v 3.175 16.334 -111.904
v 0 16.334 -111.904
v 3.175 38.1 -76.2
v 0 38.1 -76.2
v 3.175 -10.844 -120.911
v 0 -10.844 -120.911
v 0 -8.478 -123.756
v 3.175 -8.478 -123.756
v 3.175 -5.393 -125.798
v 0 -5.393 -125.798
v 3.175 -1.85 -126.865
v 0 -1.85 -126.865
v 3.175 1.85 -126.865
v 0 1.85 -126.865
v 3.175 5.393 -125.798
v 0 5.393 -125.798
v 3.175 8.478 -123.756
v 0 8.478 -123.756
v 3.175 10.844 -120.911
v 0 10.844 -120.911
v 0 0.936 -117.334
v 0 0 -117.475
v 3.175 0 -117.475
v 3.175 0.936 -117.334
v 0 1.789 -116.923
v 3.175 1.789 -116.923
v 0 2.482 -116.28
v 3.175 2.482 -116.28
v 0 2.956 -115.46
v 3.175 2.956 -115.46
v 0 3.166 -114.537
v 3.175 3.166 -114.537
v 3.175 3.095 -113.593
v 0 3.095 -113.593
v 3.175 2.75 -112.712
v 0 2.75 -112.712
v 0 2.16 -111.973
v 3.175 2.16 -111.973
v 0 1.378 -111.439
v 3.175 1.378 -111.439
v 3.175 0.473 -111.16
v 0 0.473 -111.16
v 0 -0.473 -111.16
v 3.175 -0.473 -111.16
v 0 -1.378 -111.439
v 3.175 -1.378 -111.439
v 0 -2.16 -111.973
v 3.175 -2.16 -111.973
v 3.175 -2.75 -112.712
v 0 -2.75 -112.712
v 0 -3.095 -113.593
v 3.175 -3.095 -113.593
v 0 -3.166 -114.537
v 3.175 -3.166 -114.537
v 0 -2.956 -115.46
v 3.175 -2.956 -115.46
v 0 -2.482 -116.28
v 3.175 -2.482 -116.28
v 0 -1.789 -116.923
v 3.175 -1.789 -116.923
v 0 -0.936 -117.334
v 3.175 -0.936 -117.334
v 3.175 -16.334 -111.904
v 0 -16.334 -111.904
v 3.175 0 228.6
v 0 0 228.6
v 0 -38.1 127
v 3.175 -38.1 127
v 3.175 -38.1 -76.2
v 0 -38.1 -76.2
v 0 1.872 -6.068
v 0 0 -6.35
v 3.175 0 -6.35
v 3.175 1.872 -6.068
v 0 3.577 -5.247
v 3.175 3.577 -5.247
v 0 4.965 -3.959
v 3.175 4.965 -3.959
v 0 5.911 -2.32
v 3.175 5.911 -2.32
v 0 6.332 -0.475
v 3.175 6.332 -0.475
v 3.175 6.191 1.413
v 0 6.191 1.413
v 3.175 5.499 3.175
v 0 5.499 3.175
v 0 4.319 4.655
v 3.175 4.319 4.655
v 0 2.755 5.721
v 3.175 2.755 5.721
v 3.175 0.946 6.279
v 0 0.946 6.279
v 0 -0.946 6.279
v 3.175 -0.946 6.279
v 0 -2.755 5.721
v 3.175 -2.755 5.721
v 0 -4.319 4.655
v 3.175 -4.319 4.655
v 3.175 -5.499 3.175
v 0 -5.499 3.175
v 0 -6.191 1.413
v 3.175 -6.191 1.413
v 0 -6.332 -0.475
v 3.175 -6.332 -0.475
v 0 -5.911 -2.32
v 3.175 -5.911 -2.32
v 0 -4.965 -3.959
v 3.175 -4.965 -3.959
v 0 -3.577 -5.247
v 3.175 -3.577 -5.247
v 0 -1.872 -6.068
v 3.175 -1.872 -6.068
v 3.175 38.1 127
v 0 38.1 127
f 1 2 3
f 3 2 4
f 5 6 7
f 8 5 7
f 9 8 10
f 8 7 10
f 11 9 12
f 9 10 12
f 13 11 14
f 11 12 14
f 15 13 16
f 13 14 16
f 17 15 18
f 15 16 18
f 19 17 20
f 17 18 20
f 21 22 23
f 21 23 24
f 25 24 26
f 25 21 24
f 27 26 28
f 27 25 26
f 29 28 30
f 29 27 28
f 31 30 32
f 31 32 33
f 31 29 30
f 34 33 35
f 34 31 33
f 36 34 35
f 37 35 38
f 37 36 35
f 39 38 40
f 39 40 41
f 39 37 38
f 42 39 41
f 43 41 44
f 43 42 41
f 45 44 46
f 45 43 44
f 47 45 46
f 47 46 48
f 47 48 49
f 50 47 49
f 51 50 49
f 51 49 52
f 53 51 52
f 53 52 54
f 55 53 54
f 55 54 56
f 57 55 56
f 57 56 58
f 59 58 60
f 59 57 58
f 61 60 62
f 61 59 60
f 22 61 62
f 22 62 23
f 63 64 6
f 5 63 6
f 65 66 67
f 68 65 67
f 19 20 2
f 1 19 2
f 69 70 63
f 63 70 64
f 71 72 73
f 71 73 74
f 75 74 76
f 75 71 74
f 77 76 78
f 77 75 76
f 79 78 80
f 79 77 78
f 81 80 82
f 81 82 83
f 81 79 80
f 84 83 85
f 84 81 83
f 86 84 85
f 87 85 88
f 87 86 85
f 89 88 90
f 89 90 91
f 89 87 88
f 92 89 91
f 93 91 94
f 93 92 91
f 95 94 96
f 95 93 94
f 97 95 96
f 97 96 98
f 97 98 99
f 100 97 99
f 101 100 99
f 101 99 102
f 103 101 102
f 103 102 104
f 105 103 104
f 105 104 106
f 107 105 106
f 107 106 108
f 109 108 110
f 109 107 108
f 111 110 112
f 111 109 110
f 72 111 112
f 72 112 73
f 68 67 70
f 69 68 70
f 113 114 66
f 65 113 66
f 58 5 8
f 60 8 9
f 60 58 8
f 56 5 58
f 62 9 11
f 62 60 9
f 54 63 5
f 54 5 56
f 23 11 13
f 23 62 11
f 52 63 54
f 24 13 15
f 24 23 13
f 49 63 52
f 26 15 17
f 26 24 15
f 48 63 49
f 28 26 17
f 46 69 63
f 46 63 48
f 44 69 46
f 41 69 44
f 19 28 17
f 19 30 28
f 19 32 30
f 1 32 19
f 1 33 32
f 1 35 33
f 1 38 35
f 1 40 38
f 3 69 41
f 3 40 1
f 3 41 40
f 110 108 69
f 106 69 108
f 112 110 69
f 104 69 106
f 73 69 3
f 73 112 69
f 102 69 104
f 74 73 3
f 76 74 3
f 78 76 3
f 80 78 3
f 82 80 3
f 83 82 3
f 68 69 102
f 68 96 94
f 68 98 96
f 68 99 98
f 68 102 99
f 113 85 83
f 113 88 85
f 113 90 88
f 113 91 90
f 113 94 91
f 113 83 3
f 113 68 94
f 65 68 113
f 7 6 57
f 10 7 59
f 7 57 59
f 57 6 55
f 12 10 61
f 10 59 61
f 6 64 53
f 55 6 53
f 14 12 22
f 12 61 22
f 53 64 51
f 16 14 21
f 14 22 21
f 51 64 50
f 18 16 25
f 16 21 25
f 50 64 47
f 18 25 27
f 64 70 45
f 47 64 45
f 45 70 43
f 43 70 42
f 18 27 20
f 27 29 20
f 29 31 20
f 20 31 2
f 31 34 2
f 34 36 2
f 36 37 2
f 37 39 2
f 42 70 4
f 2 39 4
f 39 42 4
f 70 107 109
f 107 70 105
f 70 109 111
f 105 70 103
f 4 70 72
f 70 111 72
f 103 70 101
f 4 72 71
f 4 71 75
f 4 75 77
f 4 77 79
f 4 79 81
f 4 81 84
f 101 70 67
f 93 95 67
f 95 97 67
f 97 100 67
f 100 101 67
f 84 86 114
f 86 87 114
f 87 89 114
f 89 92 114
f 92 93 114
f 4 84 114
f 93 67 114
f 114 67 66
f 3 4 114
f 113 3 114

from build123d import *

# Parameters (mm, degrees)
SKETCH1_R           = 6.35
SKETCH1_R_2         = 3.175
BOSS_EXTRUDE1_DEPTH = 3.175


with BuildPart() as part:
    # Sketch1 → Boss-Extrude1 (new body)
    # profile 1 of 2: a face of its own
    with BuildSketch(Plane.YZ):
        Polygon((0, 228.6), (-38.1, 127), (-38.1, -76.2), (-16.334358657, -111.904101294), (-12.7, -97.366666667), (12.7, -97.366666667), (16.334358657, -111.904101294), (38.1, -76.2), (38.1, 127), align=None)
        with Locations(Location((0, 0, 0), (0, 0, 270))):
            Circle(SKETCH1_R, mode=Mode.SUBTRACT)
    # profile 2 of 2: a face of its own
    with BuildSketch(Plane.YZ):
        with BuildLine():
            Line((-12.7, -97.366666667), (-16.334358657, -111.904101294))
            Line((-16.334358657, -111.904101294), (-10.843906908, -120.910573574))
            ThreePointArc((-10.843906908, -120.910573574), (0, -127), (10.843906908, -120.910573574))
            Line((10.843906908, -120.910573574), (16.334358657, -111.904101294))
            Line((16.334358657, -111.904101294), (12.7, -97.366666667))
            Line((12.7, -97.366666667), (-12.7, -97.366666667))
        make_face()
        with Locations(Location((0, -114.3, 0), (0, 0, 270))):
            Circle(SKETCH1_R_2, mode=Mode.SUBTRACT)
    extrude(amount=BOSS_EXTRUDE1_DEPTH)


solid = part.part
